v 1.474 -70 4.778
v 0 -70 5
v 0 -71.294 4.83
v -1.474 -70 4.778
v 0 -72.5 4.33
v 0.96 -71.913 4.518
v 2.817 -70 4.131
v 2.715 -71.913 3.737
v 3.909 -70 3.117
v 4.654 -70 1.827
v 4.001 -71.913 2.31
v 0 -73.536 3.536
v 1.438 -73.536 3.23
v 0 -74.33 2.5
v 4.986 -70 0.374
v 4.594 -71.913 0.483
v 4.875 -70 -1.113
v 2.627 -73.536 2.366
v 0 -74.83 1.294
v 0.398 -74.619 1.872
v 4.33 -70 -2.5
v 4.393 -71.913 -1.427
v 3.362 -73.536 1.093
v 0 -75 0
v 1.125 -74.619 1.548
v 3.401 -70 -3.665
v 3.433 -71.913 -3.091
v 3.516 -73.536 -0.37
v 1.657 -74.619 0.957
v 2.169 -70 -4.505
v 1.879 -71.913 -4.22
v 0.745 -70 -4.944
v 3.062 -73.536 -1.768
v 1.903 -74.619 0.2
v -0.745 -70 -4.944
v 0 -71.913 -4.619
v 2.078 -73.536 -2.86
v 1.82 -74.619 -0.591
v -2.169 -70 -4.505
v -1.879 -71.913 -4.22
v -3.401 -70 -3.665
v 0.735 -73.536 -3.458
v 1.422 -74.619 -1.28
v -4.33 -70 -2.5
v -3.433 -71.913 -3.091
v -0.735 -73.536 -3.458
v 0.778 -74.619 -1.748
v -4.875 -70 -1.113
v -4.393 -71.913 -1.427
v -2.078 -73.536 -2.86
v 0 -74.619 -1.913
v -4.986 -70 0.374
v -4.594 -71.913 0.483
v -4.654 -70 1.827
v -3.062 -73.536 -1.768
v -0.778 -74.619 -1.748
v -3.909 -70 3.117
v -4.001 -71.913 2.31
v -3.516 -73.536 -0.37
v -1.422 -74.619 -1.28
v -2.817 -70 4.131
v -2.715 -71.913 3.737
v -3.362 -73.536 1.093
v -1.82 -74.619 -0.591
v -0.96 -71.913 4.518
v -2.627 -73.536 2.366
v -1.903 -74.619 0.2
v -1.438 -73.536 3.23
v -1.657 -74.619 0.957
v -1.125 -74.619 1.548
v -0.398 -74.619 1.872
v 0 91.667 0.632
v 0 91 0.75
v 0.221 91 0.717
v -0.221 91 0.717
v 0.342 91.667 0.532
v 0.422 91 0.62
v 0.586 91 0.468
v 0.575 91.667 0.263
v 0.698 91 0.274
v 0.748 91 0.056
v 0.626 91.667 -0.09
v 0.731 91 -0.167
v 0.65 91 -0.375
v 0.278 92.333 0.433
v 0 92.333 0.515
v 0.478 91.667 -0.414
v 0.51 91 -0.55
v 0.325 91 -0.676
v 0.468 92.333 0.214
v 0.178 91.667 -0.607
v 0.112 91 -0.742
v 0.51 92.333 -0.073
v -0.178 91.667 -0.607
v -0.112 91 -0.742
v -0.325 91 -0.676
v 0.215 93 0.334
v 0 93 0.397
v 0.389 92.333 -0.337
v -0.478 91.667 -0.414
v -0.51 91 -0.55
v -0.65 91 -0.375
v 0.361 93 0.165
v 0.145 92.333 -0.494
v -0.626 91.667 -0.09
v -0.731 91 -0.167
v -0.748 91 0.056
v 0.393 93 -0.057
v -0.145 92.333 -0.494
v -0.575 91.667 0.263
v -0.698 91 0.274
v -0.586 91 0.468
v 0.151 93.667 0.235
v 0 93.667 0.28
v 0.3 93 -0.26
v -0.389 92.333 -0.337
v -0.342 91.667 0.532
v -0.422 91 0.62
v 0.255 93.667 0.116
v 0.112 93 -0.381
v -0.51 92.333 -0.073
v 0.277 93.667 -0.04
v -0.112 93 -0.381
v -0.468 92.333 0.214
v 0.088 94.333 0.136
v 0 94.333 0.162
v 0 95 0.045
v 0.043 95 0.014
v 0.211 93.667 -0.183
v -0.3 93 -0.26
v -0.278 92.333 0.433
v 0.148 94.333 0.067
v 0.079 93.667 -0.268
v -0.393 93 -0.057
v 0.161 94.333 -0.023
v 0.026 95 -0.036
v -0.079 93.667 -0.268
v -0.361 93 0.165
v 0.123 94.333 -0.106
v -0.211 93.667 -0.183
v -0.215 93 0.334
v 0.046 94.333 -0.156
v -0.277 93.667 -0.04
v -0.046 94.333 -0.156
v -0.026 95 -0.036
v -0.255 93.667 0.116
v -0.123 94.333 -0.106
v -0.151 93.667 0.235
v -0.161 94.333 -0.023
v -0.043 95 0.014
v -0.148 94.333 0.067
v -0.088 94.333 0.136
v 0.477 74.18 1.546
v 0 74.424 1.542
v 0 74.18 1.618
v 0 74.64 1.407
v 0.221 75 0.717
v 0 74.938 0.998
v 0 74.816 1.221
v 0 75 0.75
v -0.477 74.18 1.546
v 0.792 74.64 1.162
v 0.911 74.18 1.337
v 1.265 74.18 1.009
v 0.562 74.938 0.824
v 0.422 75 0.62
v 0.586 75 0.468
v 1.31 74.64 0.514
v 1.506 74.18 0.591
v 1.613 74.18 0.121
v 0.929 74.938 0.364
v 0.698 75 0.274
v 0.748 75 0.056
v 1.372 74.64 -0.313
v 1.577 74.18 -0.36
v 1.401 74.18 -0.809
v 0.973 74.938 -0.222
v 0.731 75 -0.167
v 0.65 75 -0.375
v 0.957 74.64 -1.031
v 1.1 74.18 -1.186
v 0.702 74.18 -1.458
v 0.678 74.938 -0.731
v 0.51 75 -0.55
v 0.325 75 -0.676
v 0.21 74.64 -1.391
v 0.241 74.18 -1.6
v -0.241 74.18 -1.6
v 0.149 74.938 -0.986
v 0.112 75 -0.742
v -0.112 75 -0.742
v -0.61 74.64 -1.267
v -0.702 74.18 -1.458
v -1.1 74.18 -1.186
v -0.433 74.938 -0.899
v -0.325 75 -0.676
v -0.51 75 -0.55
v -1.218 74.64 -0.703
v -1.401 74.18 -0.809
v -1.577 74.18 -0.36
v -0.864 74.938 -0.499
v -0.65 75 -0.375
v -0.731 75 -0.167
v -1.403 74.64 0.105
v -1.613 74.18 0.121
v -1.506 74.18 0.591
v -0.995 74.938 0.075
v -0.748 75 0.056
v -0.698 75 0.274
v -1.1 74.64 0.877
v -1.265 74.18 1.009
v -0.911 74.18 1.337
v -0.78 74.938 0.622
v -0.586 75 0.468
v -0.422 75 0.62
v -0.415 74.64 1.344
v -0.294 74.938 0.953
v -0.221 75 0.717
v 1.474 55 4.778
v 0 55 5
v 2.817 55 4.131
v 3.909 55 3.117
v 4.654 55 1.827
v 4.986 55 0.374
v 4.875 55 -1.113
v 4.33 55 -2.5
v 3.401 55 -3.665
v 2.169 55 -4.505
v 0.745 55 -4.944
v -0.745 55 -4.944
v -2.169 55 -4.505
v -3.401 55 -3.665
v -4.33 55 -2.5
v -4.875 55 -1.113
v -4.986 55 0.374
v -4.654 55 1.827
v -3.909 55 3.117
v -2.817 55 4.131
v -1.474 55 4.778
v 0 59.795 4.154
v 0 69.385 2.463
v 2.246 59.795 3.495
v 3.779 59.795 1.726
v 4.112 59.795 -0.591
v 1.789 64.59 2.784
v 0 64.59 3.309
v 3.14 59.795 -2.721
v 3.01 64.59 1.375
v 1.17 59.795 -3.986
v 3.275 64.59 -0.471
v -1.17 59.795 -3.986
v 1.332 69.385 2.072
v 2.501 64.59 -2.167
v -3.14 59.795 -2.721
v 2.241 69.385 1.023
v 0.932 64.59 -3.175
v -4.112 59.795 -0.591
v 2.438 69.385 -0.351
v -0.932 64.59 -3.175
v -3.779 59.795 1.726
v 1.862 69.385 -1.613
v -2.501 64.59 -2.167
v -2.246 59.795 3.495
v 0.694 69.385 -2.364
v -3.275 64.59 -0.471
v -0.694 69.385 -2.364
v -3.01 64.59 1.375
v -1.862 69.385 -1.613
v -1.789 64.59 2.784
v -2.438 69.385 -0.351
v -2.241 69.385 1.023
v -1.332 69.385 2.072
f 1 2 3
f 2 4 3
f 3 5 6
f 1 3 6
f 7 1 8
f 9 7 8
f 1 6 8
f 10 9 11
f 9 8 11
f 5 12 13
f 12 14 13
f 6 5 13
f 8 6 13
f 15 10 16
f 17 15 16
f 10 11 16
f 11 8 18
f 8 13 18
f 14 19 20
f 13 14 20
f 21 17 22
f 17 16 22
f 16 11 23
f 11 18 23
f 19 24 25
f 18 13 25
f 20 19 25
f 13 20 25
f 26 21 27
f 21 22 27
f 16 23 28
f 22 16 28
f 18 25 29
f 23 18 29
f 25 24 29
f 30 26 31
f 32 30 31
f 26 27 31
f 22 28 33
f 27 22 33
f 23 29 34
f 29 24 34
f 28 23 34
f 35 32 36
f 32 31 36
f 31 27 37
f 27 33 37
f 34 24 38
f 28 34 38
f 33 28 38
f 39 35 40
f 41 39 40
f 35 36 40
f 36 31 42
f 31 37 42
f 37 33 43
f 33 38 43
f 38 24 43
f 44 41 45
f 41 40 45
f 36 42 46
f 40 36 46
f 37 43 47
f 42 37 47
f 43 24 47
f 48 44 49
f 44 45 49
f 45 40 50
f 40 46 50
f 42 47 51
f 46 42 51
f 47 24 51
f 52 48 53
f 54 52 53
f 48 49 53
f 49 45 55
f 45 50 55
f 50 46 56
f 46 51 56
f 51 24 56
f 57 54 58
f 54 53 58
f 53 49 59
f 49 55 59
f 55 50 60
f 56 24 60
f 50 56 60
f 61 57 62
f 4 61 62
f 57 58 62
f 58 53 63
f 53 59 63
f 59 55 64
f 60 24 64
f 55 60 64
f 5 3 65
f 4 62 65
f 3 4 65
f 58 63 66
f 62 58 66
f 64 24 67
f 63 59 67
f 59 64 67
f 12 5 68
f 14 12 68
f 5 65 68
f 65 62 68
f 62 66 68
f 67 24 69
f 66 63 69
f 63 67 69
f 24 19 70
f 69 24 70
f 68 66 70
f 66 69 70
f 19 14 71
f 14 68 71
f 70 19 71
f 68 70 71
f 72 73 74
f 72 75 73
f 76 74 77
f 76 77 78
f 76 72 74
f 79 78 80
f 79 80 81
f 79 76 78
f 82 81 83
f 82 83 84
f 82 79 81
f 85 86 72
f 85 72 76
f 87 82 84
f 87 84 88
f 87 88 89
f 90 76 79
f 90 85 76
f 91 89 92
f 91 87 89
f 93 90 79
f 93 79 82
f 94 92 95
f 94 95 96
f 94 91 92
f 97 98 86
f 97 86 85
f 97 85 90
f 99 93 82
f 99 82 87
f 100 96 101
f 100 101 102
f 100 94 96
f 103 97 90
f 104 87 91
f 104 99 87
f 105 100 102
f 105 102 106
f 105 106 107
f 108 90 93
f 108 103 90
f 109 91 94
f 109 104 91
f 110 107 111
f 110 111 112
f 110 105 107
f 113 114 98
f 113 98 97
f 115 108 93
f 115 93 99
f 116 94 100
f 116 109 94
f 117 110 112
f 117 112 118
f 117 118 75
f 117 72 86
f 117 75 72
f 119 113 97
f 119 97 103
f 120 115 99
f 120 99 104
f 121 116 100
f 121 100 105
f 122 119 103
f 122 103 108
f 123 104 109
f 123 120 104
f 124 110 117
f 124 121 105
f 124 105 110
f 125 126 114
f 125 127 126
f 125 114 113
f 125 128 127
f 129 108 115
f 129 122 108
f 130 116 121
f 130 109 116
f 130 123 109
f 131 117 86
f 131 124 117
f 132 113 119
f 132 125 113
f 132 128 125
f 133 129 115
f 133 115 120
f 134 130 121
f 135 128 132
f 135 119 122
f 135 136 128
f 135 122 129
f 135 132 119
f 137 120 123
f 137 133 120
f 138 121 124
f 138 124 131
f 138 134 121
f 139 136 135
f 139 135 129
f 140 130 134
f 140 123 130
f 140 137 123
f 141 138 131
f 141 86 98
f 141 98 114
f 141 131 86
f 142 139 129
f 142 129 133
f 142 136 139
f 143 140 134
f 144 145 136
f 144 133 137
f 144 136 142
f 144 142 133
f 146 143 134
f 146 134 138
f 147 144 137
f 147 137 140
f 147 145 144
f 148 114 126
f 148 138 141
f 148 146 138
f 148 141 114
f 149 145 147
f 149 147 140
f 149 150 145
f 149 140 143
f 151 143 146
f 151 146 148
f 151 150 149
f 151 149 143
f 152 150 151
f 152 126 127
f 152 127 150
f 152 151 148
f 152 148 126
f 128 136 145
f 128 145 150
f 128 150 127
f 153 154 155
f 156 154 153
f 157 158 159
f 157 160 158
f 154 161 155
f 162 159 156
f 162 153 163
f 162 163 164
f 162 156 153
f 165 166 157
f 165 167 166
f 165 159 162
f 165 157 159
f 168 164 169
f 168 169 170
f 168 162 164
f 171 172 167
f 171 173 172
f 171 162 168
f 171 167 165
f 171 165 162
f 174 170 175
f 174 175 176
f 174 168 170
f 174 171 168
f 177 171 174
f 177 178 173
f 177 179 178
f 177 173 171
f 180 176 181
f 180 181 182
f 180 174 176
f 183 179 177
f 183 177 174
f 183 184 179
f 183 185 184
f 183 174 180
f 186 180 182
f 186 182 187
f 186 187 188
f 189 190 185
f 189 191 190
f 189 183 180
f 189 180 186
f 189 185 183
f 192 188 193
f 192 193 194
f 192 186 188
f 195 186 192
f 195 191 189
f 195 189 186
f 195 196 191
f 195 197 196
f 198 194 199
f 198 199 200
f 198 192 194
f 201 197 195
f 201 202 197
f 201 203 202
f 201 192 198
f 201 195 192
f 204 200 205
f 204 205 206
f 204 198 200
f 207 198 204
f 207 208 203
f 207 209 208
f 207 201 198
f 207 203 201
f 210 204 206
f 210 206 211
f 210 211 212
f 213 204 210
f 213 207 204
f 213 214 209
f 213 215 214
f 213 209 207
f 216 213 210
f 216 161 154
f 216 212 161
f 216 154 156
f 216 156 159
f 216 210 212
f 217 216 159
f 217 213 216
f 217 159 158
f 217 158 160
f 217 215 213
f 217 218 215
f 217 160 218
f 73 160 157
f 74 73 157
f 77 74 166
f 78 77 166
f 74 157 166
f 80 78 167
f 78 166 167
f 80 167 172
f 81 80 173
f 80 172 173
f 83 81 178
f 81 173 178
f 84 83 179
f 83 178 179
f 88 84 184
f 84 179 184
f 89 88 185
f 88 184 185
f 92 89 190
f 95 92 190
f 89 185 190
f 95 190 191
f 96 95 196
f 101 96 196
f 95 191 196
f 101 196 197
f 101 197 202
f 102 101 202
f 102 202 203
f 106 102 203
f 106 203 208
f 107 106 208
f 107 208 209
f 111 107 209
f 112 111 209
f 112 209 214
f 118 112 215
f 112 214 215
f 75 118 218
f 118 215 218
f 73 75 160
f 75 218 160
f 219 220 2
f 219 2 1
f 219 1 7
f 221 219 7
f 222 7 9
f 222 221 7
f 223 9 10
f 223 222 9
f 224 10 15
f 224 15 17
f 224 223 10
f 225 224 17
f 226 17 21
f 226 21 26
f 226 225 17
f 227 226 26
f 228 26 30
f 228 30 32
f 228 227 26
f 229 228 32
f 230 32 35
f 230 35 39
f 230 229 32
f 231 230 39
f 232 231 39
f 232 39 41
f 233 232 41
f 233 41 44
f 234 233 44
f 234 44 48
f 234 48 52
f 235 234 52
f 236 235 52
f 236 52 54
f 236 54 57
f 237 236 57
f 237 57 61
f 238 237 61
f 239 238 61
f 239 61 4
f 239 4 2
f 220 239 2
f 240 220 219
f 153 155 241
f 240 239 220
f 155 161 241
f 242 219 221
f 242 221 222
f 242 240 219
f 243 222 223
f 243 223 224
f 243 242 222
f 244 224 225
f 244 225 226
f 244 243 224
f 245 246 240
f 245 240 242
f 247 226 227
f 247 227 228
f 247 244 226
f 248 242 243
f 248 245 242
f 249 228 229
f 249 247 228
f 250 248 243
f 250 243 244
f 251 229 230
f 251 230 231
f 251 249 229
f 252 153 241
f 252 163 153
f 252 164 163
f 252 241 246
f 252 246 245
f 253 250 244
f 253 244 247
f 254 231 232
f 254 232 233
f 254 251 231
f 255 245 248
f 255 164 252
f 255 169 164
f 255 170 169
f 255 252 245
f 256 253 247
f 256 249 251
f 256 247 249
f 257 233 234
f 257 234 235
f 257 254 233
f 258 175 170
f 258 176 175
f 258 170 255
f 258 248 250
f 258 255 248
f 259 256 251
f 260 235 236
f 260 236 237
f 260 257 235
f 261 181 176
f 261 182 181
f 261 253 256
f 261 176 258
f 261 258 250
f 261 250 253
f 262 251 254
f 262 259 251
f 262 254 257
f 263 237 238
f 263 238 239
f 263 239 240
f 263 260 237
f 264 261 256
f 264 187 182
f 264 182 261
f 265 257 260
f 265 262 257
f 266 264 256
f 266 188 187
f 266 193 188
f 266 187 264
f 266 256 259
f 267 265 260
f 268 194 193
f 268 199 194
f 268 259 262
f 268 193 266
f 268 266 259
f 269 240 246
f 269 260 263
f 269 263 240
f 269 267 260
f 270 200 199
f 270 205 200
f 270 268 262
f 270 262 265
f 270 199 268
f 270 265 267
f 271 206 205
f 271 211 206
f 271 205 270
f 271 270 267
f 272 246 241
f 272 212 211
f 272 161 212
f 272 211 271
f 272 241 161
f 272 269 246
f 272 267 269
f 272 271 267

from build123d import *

# Parameters (mm, degrees)
SKETCH1_R           = 5
BOSS_EXTRUDE1_DEPTH = 75
CHAMFER1_SIZE       = 20
CHAMFER1_SIZE2      = 3.526539614
FILLET1_R           = 5
SKETCH2_R           = 0.75
BOSS_EXTRUDE2_DEPTH = 20
CHAMFER2_SIZE       = 4
CHAMFER2_SIZE2      = 0.705307923
FILLET2_R           = 1


with BuildPart() as part:
    # Sketch1 → Boss-Extrude1 (new, symmetric)
    with BuildSketch(Plane(origin=(0, 0, 0), x_dir=(1, 0, 0), z_dir=(0, 1, 0))):
        with Locations(Location((0, 0, 0), (0, 0, 270))):
            Circle(SKETCH1_R)
    extrude(amount=BOSS_EXTRUDE1_DEPTH, both=True)

    # Chamfer1
    chamfer1_edges = [part.edges().sort_by_distance(p)[0] for p in [
        (0, 75, -5),
    ]]
    chamfer1_side = [part.faces().sort_by_distance(p)[0] for p in [
        (0, 0, -5),
    ]]
    chamfer(chamfer1_edges, length=CHAMFER1_SIZE, length2=CHAMFER1_SIZE2, reference=chamfer1_side[0])

    # Fillet1
    fillet1_edges = [part.edges().sort_by_distance(p)[0] for p in [
        (0, -75, -5),
    ]]
    fillet(fillet1_edges, radius=FILLET1_R)

    # Sketch2 → Boss-Extrude2 (add)
    with BuildSketch(Plane(origin=(0, 75, 0), x_dir=(1, 0, 0), z_dir=(0, 1, 0))):
        with Locations(Location((0, 0, 0), (0, 0, 270))):
            Circle(SKETCH2_R)
    extrude(amount=BOSS_EXTRUDE2_DEPTH)

    # Chamfer2
    chamfer2_edges = [part.edges().sort_by_distance(p)[0] for p in [
        (0, 95, -0.75),
    ]]
    chamfer2_side = [part.faces().sort_by_distance(p)[0] for p in [
        (0, 85, -0.75),
    ]]
    chamfer(chamfer2_edges, length=CHAMFER2_SIZE, length2=CHAMFER2_SIZE2, reference=chamfer2_side[0])

    # Fillet2
    # the kernel refuses this fillet: 1 mm, written as the material it takes off along each edge
    with BuildSketch(Plane(origin=(0, 75, 0), x_dir=(0, 0, 1), z_dir=(-1, 0, 0))) as fillet2_piece_1:
        with BuildLine():
            CenterArc((0.6331529, -0.993149916), FILLET2_R, 10, 73.289825559)
            Line((1.617960653, -0.819501738), (1.637656808, -0.816028775))
            Line((1.637656808, -0.816028775), (1.493156541, 0.003472964))
            Line((1.493156541, 0.003472964), (1.473460386, 0.02))
            ThreePointArc((1.473460386, 0.02), (1.111730193, 0.02), (0.752336942, 0.019862998))
            Line((0.752336942, 0.019862998), (0.75, 0))
        make_face()
    revolve(axis=Axis((0, 75, 0), (0, 1, 0)), mode=Mode.SUBTRACT)


solid = part.part
